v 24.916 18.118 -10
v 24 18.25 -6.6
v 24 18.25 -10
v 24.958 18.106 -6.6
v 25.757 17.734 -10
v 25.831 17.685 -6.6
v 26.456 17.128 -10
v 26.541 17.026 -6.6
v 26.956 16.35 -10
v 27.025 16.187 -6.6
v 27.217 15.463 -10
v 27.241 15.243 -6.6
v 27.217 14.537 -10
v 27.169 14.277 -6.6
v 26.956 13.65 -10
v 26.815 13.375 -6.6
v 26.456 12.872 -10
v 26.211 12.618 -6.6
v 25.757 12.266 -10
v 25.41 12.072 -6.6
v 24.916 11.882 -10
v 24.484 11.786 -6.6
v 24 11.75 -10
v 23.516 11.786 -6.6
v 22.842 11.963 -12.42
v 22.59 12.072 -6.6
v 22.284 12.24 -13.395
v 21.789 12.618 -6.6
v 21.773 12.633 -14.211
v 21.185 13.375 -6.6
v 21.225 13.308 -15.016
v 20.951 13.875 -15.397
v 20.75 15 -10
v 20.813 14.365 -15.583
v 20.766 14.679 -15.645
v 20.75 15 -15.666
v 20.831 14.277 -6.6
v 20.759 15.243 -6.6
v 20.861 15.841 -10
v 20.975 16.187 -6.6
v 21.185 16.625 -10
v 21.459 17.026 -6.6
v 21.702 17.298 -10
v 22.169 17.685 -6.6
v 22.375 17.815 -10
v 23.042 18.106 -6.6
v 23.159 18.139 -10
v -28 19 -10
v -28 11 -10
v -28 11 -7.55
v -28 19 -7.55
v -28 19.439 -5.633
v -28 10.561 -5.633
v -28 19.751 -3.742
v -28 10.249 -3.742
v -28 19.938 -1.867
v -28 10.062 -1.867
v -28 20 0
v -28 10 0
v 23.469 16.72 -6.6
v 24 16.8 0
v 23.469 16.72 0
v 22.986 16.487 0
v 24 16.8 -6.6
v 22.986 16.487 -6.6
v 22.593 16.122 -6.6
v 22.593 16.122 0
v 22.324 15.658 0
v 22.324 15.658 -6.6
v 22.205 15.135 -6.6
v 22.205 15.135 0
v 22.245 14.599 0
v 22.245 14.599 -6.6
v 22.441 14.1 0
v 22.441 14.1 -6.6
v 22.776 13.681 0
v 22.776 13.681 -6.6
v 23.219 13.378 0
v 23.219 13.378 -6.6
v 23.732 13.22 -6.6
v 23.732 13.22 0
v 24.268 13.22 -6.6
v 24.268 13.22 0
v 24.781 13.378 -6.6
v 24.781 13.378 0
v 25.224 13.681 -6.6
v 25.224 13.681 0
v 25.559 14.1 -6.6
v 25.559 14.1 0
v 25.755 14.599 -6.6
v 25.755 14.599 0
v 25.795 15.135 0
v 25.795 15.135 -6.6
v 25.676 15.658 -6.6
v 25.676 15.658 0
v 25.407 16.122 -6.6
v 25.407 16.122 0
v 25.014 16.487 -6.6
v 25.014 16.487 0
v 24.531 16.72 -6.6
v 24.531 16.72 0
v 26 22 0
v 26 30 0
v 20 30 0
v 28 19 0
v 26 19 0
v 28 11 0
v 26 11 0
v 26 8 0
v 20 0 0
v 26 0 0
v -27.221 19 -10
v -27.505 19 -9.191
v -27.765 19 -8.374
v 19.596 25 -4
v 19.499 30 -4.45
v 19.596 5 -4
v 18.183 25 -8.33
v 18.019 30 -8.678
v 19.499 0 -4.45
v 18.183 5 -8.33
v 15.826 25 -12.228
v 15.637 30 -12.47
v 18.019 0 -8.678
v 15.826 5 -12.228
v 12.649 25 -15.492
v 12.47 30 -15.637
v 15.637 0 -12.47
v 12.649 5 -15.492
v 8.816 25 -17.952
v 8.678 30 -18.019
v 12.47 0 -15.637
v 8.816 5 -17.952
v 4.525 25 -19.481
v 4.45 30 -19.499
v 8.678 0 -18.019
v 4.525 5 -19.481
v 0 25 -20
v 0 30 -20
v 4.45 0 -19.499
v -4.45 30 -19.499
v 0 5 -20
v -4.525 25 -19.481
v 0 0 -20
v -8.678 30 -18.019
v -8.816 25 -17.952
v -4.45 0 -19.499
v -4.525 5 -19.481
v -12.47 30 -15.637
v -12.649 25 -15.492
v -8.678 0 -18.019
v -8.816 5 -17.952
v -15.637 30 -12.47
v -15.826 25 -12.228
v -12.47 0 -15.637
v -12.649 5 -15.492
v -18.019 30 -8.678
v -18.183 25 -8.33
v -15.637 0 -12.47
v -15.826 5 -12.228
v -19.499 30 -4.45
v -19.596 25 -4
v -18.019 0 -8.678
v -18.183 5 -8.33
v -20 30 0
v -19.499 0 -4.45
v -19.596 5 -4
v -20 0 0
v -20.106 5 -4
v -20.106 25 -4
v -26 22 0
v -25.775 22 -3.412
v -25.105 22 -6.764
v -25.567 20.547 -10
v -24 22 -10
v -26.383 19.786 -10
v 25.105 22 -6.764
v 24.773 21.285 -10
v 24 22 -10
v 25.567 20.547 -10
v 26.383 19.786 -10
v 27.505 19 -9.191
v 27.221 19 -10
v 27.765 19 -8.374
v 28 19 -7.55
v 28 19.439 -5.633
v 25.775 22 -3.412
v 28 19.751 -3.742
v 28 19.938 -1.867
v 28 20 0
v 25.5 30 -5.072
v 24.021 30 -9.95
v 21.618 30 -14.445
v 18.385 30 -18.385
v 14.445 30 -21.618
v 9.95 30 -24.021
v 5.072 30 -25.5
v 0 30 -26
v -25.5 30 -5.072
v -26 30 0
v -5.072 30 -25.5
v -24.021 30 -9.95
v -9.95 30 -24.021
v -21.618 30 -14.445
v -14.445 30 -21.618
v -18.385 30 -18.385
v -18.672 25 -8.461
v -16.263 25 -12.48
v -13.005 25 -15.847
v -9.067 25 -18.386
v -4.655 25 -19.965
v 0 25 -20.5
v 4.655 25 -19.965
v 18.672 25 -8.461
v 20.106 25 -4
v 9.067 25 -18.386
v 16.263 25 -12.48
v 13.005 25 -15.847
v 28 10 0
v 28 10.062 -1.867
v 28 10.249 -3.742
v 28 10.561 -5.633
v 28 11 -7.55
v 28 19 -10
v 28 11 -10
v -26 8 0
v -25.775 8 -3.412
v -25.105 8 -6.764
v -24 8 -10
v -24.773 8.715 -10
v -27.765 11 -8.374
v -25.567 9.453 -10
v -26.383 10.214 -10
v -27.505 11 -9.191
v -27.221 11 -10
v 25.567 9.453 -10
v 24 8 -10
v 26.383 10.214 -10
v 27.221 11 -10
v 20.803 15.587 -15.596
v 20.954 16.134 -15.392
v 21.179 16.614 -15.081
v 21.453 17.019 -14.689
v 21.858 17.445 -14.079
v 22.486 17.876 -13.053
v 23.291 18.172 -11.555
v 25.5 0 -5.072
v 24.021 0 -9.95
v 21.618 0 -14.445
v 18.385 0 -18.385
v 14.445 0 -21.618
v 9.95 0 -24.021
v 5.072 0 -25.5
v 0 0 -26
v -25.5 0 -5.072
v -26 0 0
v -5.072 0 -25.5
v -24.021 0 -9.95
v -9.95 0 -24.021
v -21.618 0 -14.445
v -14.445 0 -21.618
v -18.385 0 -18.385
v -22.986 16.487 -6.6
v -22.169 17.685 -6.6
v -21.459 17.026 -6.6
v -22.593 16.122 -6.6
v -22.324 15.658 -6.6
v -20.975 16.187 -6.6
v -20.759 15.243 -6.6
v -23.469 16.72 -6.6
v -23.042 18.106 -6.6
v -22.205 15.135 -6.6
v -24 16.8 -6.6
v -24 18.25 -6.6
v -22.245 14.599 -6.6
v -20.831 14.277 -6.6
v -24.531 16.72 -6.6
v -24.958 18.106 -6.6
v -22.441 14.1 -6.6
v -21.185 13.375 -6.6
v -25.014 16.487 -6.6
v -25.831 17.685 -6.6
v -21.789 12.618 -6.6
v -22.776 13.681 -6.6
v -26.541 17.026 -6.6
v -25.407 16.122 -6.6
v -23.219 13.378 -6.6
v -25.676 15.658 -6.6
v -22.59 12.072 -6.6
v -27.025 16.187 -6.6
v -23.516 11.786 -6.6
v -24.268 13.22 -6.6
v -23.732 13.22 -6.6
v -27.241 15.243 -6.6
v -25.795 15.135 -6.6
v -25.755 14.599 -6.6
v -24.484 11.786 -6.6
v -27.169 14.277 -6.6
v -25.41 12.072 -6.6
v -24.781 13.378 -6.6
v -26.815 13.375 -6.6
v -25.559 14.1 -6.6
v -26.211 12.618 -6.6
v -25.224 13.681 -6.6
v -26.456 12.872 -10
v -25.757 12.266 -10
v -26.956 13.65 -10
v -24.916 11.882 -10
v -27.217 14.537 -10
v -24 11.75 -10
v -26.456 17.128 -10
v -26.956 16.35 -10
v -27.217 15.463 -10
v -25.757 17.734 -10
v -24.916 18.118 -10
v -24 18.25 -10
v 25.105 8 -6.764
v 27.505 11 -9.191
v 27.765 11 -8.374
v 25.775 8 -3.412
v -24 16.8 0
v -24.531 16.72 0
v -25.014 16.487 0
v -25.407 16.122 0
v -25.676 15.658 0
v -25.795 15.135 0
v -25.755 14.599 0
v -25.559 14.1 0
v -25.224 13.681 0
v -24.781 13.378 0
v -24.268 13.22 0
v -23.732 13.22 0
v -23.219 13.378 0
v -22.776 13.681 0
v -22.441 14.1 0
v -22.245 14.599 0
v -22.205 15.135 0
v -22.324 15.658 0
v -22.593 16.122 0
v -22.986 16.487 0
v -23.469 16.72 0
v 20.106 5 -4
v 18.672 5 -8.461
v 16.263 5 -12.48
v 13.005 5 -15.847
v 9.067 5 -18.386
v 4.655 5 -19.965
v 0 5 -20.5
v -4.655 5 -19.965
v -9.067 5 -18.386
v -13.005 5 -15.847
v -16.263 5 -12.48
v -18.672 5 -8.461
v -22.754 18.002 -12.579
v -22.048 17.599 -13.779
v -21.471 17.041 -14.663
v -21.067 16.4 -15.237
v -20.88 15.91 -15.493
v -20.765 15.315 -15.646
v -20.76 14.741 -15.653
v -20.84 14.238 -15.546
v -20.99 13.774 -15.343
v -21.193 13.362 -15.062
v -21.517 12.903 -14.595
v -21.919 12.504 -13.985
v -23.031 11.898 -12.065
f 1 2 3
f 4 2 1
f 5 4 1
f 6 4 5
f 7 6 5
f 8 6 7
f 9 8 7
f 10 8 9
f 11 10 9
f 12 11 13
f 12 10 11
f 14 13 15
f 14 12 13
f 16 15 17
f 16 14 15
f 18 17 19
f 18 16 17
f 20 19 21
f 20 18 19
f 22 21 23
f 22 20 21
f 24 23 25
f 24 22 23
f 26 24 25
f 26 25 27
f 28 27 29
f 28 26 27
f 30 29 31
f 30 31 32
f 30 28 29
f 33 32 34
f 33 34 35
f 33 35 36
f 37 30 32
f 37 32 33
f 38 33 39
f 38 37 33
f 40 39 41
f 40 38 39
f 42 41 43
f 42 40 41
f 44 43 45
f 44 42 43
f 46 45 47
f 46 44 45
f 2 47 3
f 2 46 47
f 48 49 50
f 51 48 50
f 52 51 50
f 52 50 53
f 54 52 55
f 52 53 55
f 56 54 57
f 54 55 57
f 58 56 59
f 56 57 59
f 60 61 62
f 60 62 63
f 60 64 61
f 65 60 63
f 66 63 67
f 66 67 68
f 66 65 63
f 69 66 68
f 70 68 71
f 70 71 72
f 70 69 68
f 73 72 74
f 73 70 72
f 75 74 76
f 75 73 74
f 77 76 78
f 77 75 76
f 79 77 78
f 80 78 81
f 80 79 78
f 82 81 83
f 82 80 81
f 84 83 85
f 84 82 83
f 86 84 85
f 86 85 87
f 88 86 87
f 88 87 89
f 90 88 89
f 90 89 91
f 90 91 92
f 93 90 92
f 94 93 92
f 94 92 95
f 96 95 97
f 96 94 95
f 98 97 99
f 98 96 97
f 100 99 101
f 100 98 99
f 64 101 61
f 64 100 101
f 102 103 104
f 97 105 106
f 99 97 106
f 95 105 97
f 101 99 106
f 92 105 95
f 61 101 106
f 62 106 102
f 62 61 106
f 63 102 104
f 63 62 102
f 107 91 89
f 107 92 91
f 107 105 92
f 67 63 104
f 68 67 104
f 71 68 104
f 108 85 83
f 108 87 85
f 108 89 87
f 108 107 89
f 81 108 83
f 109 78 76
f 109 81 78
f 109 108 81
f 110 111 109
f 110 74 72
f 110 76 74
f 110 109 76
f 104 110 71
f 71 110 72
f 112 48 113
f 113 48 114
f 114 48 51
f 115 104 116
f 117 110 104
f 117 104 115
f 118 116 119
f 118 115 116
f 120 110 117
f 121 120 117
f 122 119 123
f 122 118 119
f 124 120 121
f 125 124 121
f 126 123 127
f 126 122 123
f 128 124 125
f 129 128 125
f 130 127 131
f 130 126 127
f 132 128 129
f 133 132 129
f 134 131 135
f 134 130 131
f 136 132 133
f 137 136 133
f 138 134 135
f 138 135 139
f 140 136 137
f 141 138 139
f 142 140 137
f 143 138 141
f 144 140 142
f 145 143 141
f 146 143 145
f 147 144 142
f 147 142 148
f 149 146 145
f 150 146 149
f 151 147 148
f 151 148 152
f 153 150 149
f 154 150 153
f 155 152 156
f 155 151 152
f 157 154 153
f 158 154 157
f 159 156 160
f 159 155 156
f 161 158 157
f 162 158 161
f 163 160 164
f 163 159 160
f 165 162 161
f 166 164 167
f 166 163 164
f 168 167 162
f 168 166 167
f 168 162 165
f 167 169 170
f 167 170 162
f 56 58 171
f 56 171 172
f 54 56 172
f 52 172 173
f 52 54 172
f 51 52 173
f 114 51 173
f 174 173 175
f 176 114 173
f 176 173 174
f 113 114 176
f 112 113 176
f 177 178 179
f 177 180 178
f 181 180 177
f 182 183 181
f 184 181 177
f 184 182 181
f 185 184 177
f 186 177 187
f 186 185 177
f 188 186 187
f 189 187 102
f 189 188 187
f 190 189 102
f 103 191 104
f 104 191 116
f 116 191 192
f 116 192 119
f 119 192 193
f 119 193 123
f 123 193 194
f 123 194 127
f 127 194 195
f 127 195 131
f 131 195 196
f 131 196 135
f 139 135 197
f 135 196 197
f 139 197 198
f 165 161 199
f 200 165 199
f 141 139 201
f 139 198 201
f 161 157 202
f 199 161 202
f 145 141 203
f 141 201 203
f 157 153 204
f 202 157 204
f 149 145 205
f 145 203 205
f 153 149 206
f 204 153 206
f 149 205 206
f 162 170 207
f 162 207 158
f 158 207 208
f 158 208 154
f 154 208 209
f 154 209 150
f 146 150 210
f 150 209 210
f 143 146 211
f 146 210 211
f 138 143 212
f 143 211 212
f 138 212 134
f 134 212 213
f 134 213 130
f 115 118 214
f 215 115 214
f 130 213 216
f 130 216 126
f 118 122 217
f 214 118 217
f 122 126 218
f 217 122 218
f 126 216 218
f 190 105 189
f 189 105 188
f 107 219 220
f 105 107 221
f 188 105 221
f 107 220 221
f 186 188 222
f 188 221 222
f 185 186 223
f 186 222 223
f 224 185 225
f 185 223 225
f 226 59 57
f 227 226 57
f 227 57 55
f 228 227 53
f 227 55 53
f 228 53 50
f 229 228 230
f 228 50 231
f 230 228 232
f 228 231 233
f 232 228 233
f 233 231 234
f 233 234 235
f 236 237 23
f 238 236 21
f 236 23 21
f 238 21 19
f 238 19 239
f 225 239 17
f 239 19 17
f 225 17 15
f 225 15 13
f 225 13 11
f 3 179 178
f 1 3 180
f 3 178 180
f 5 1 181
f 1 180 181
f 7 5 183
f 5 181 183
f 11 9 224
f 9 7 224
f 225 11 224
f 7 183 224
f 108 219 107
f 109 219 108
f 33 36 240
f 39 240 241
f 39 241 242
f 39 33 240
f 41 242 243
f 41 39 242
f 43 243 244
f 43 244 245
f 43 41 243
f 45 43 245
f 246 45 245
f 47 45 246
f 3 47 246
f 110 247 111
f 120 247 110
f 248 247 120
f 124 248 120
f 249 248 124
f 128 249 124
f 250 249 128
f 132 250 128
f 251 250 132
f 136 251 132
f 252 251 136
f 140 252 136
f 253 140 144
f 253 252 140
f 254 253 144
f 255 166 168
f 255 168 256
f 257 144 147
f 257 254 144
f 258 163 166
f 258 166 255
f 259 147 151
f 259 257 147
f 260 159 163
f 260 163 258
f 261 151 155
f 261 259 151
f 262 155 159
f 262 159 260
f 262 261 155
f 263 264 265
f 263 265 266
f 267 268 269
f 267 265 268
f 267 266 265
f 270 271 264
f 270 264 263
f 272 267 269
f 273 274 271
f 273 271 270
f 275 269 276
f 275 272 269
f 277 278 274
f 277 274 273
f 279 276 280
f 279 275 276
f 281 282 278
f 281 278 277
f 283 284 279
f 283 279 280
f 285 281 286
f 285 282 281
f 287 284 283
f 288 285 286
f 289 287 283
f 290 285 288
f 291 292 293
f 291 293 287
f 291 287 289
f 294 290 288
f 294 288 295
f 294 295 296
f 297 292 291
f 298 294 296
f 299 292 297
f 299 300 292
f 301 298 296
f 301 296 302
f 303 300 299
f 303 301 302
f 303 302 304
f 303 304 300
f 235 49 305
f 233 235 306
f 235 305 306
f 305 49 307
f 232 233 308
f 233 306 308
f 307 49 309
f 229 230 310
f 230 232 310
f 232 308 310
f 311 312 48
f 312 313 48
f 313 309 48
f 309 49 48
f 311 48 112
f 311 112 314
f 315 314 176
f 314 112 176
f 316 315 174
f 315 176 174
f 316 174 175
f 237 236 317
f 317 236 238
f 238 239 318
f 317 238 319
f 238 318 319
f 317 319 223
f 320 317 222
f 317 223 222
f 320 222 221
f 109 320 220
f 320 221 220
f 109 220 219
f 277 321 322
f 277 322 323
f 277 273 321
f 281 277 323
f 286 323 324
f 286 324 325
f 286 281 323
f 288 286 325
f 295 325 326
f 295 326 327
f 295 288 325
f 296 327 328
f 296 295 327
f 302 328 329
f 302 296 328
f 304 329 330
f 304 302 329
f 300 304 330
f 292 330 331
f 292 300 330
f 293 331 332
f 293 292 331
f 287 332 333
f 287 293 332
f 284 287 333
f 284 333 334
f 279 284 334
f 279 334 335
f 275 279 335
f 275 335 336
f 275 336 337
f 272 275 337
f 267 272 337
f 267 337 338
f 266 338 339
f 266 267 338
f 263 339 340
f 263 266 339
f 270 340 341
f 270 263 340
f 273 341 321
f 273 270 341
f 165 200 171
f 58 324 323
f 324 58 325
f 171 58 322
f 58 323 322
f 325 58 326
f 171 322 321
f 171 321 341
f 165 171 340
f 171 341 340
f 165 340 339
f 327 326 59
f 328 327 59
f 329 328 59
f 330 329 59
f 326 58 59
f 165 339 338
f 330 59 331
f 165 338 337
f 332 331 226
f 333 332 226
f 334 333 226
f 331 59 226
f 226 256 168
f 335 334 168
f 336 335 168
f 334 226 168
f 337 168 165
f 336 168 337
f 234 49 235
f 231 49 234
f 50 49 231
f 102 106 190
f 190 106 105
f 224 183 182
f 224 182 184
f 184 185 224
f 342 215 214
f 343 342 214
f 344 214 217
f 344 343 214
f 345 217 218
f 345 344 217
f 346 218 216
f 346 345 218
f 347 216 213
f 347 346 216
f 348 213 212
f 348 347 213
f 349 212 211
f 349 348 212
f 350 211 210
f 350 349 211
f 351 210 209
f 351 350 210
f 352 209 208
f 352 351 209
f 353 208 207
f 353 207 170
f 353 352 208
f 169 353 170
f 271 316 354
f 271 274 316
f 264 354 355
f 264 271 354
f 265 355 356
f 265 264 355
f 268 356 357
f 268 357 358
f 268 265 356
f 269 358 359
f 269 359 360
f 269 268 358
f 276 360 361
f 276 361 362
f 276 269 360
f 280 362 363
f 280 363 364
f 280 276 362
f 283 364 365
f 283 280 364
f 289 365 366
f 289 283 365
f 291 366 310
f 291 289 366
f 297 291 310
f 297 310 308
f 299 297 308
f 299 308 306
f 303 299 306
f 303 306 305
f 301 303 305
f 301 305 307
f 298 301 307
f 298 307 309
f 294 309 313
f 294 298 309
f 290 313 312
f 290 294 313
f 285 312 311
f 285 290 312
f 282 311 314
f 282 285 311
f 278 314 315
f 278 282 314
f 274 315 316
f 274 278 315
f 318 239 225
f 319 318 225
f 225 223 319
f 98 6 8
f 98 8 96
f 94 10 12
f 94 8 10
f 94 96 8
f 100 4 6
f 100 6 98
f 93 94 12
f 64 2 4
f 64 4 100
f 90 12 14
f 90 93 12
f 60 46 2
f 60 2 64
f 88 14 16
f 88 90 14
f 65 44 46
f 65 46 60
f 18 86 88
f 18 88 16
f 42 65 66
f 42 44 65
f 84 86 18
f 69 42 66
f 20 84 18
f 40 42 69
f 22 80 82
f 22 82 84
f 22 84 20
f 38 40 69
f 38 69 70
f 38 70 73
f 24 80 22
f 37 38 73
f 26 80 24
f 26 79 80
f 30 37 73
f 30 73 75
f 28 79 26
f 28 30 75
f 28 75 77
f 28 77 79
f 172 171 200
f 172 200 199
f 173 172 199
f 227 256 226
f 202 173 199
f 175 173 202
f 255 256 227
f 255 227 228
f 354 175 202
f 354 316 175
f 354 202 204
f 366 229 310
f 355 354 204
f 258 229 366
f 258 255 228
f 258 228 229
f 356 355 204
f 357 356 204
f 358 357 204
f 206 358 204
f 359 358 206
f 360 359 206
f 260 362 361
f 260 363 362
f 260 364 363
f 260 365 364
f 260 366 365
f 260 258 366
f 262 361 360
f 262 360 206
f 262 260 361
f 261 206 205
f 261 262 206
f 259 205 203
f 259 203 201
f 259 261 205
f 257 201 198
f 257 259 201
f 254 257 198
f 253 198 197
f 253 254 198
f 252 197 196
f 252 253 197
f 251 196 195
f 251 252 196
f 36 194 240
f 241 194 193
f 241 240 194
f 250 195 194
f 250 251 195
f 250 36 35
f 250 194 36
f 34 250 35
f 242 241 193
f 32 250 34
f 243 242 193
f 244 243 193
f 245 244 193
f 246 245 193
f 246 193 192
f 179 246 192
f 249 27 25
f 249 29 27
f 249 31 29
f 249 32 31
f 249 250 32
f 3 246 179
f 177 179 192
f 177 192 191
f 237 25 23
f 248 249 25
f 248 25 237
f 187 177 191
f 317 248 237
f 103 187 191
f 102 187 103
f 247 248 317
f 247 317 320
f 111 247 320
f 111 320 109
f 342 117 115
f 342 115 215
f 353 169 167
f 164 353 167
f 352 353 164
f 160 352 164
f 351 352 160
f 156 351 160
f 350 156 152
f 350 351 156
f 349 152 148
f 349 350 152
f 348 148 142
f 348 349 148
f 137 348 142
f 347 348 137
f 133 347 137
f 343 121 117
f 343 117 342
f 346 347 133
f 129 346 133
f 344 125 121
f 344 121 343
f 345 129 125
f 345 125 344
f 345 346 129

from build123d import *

# Parameters (mm, degrees)
BOSS_EXTRUDE1_DEPTH                          = 30
SKETCH2_W                                    = 8
SKETCH2_H                                    = 8
BOSS_EXTRUDE2_DEPTH                          = 10
CBORE_FOR_M3_HEX_SOCKET_HEAD_CAP_SCR_2_COUNT = 2
CBORE_FOR_M3_HEX_SOCKET_HEAD_CAP_SCR_2_PITCH = 48
SKETCH21_R                                   = 3.25
CUT_EXTRUDE2_DEPTH                           = 46.391188572
CUT_EXTRUDE3_START                           = -25
CUT_EXTRUDE3_DEPTH                           = 20
CHAMFER1_SIZE                                = 3


with BuildPart() as part:
    # Sketch1 → Boss-Extrude1 (new body)
    with BuildSketch(Plane(origin=(0, 0, 0), x_dir=(1, 0, 0), z_dir=(0, 1, 0))):
        with BuildLine():
            Line((26, 0), (20, 0))
            ThreePointArc((20, 0), (0, 20), (-20, 0))
            Line((-20, 0), (-26, 0))
            ThreePointArc((-26, 0), (0, 26), (26, 0))
        make_face()
    extrude(amount=BOSS_EXTRUDE1_DEPTH)

    # Sketch2 → Boss-Extrude2 (add)
    with BuildSketch(Plane.XY):
        with Locations((24, 15)):
            Rectangle(SKETCH2_W, SKETCH2_H)
        with Locations((-24, 15)):
            Rectangle(SKETCH2_W, SKETCH2_H)
    extrude(amount=-BOSS_EXTRUDE2_DEPTH)

    # Sketch20 → CBORE for M3 Hex Socket Head Cap Screw4 (revolve, cut)
    with BuildSketch(Plane(origin=(24, 15, -10), x_dir=(0, 1, 0), z_dir=(1, 0, 0))):
        Polygon((0, 0), (0, 10), (1.8, 10), (1.8, 3.4), (3.25, 3.4), (3.25, 0), align=None)
    cbore_for_m3_hex_socket_head_cap_screw4 = revolve(axis=Axis((24, 15, -16.35), (0, 0, 1)), mode=Mode.SUBTRACT)

    # CBORE for M3 Hex Socket Head Cap Scr 2: CBORE for M3 Hex Socket Head Cap Screw4 ×2
    with Locations(*[(-i * CBORE_FOR_M3_HEX_SOCKET_HEAD_CAP_SCR_2_PITCH, 0, 0) for i in range(1, CBORE_FOR_M3_HEX_SOCKET_HEAD_CAP_SCR_2_COUNT)]):
        add(cbore_for_m3_hex_socket_head_cap_screw4, mode=Mode.SUBTRACT)

    # Sketch21 → Cut-Extrude2 (cut, through all)
    with BuildSketch(Plane(origin=(0, 0, -6.6), x_dir=(-1, 0, 0), z_dir=(0, 0, -1))):
        with Locations((24, 15)):
            Circle(SKETCH21_R)
        with Locations((-24, 15)):
            Circle(SKETCH21_R)
    extrude(amount=CUT_EXTRUDE2_DEPTH, mode=Mode.SUBTRACT)

    # Sketch22 → Cut-Extrude3 (cut)
    with BuildSketch(Plane(origin=(0, 30, 0), x_dir=(1, 0, 0), z_dir=(0, 1, 0)).offset(CUT_EXTRUDE3_START)):
        with BuildLine():
            Line((-20.105969263, 4), (-19.595917942, 4))
            ThreePointArc((-19.595917942, 4), (0, 20), (19.595917942, 4))
            Line((19.595917942, 4), (20.105969263, 4))
            ThreePointArc((20.105969263, 4), (0, 20.5), (-20.105969263, 4))
        make_face()
    extrude(amount=CUT_EXTRUDE3_DEPTH, mode=Mode.SUBTRACT)

    # Chamfer1
    # the kernel refuses this chamfer: 3 mm, written as the material it adds along each edge
    with BuildSketch(Plane(origin=(0, 11, 0), x_dir=(0.7702703819055875, 0, -0.6377174442956852), z_dir=(-0.6377174442956852, 0, -0.7702703819055875))) as chamfer1_piece_1_section:
        Polygon((26, CHAMFER1_SIZE), (26 + CHAMFER1_SIZE, 0), (26, 0), align=None)
    chamfer1_piece_1 = revolve(axis=Axis((0, 11, 0), (0, -1, 0)), revolution_arc=39.621824877, mode=Mode.PRIVATE)
    chamfer1_piece_1 = split(chamfer1_piece_1, bisect_by=Plane(origin=(26.235677781, 9.966963305, -10), z_dir=(0, 0, 1)), keep=Keep.TOP, mode=Mode.PRIVATE)
    chamfer1_piece_1 = split(chamfer1_piece_1, bisect_by=Plane(origin=(28, 9.966963305, -5.200282344), z_dir=(-1, 0, 0)), keep=Keep.TOP, mode=Mode.PRIVATE)
    add(chamfer1_piece_1)
    with BuildSketch(Plane(origin=(0, 19, 0), x_dir=(0.7702703819055875, 0, -0.6377174442956852), z_dir=(-0.6377174442956852, 0, -0.7702703819055875))) as chamfer1_piece_2_section:
        Polygon((26, -CHAMFER1_SIZE), (26 + CHAMFER1_SIZE, 0), (26, 0), align=None)
    chamfer1_piece_2 = revolve(axis=Axis((0, 19, 0), (0, -1, 0)), revolution_arc=39.621824877, mode=Mode.PRIVATE)
    chamfer1_piece_2 = split(chamfer1_piece_2, bisect_by=Plane(origin=(26.235677781, 20.033036695, -10), z_dir=(0, 0, 1)), keep=Keep.TOP, mode=Mode.PRIVATE)
    chamfer1_piece_2 = split(chamfer1_piece_2, bisect_by=Plane(origin=(28, 20.033036695, -5.200282344), z_dir=(-1, 0, 0)), keep=Keep.TOP, mode=Mode.PRIVATE)
    add(chamfer1_piece_2)
    with BuildSketch(Plane(origin=(0, 19, 0), x_dir=(-1, 0, 0), z_dir=(0, 0, 1))) as chamfer1_piece_3_section:
        Polygon((26, -CHAMFER1_SIZE), (26 + CHAMFER1_SIZE, 0), (26, 0), align=None)
    chamfer1_piece_3 = revolve(axis=Axis((0, 19, 0), (0, -1, 0)), revolution_arc=39.621824877, mode=Mode.PRIVATE)
    chamfer1_piece_3 = split(chamfer1_piece_3, bisect_by=Plane(origin=(-26.235677756, 20.033036715, -10), z_dir=(0, 0, 1)), keep=Keep.TOP, mode=Mode.PRIVATE)
    chamfer1_piece_3 = split(chamfer1_piece_3, bisect_by=Plane(origin=(-28, 20.033036715, -5.200282276), z_dir=(1, 0, 0)), keep=Keep.TOP, mode=Mode.PRIVATE)
    add(chamfer1_piece_3)
    with BuildSketch(Plane(origin=(0, 11, 0), x_dir=(-1, 0, 0), z_dir=(0, 0, 1))) as chamfer1_piece_4_section:
        Polygon((26, CHAMFER1_SIZE), (26 + CHAMFER1_SIZE, 0), (26, 0), align=None)
    chamfer1_piece_4 = revolve(axis=Axis((0, 11, 0), (0, -1, 0)), revolution_arc=39.621824877, mode=Mode.PRIVATE)
    chamfer1_piece_4 = split(chamfer1_piece_4, bisect_by=Plane(origin=(-26.235677756, 9.966963285, -10), z_dir=(0, 0, 1)), keep=Keep.TOP, mode=Mode.PRIVATE)
    chamfer1_piece_4 = split(chamfer1_piece_4, bisect_by=Plane(origin=(-28, 9.966963285, -5.200282276), z_dir=(1, 0, 0)), keep=Keep.TOP, mode=Mode.PRIVATE)
    add(chamfer1_piece_4)


solid = part.part
